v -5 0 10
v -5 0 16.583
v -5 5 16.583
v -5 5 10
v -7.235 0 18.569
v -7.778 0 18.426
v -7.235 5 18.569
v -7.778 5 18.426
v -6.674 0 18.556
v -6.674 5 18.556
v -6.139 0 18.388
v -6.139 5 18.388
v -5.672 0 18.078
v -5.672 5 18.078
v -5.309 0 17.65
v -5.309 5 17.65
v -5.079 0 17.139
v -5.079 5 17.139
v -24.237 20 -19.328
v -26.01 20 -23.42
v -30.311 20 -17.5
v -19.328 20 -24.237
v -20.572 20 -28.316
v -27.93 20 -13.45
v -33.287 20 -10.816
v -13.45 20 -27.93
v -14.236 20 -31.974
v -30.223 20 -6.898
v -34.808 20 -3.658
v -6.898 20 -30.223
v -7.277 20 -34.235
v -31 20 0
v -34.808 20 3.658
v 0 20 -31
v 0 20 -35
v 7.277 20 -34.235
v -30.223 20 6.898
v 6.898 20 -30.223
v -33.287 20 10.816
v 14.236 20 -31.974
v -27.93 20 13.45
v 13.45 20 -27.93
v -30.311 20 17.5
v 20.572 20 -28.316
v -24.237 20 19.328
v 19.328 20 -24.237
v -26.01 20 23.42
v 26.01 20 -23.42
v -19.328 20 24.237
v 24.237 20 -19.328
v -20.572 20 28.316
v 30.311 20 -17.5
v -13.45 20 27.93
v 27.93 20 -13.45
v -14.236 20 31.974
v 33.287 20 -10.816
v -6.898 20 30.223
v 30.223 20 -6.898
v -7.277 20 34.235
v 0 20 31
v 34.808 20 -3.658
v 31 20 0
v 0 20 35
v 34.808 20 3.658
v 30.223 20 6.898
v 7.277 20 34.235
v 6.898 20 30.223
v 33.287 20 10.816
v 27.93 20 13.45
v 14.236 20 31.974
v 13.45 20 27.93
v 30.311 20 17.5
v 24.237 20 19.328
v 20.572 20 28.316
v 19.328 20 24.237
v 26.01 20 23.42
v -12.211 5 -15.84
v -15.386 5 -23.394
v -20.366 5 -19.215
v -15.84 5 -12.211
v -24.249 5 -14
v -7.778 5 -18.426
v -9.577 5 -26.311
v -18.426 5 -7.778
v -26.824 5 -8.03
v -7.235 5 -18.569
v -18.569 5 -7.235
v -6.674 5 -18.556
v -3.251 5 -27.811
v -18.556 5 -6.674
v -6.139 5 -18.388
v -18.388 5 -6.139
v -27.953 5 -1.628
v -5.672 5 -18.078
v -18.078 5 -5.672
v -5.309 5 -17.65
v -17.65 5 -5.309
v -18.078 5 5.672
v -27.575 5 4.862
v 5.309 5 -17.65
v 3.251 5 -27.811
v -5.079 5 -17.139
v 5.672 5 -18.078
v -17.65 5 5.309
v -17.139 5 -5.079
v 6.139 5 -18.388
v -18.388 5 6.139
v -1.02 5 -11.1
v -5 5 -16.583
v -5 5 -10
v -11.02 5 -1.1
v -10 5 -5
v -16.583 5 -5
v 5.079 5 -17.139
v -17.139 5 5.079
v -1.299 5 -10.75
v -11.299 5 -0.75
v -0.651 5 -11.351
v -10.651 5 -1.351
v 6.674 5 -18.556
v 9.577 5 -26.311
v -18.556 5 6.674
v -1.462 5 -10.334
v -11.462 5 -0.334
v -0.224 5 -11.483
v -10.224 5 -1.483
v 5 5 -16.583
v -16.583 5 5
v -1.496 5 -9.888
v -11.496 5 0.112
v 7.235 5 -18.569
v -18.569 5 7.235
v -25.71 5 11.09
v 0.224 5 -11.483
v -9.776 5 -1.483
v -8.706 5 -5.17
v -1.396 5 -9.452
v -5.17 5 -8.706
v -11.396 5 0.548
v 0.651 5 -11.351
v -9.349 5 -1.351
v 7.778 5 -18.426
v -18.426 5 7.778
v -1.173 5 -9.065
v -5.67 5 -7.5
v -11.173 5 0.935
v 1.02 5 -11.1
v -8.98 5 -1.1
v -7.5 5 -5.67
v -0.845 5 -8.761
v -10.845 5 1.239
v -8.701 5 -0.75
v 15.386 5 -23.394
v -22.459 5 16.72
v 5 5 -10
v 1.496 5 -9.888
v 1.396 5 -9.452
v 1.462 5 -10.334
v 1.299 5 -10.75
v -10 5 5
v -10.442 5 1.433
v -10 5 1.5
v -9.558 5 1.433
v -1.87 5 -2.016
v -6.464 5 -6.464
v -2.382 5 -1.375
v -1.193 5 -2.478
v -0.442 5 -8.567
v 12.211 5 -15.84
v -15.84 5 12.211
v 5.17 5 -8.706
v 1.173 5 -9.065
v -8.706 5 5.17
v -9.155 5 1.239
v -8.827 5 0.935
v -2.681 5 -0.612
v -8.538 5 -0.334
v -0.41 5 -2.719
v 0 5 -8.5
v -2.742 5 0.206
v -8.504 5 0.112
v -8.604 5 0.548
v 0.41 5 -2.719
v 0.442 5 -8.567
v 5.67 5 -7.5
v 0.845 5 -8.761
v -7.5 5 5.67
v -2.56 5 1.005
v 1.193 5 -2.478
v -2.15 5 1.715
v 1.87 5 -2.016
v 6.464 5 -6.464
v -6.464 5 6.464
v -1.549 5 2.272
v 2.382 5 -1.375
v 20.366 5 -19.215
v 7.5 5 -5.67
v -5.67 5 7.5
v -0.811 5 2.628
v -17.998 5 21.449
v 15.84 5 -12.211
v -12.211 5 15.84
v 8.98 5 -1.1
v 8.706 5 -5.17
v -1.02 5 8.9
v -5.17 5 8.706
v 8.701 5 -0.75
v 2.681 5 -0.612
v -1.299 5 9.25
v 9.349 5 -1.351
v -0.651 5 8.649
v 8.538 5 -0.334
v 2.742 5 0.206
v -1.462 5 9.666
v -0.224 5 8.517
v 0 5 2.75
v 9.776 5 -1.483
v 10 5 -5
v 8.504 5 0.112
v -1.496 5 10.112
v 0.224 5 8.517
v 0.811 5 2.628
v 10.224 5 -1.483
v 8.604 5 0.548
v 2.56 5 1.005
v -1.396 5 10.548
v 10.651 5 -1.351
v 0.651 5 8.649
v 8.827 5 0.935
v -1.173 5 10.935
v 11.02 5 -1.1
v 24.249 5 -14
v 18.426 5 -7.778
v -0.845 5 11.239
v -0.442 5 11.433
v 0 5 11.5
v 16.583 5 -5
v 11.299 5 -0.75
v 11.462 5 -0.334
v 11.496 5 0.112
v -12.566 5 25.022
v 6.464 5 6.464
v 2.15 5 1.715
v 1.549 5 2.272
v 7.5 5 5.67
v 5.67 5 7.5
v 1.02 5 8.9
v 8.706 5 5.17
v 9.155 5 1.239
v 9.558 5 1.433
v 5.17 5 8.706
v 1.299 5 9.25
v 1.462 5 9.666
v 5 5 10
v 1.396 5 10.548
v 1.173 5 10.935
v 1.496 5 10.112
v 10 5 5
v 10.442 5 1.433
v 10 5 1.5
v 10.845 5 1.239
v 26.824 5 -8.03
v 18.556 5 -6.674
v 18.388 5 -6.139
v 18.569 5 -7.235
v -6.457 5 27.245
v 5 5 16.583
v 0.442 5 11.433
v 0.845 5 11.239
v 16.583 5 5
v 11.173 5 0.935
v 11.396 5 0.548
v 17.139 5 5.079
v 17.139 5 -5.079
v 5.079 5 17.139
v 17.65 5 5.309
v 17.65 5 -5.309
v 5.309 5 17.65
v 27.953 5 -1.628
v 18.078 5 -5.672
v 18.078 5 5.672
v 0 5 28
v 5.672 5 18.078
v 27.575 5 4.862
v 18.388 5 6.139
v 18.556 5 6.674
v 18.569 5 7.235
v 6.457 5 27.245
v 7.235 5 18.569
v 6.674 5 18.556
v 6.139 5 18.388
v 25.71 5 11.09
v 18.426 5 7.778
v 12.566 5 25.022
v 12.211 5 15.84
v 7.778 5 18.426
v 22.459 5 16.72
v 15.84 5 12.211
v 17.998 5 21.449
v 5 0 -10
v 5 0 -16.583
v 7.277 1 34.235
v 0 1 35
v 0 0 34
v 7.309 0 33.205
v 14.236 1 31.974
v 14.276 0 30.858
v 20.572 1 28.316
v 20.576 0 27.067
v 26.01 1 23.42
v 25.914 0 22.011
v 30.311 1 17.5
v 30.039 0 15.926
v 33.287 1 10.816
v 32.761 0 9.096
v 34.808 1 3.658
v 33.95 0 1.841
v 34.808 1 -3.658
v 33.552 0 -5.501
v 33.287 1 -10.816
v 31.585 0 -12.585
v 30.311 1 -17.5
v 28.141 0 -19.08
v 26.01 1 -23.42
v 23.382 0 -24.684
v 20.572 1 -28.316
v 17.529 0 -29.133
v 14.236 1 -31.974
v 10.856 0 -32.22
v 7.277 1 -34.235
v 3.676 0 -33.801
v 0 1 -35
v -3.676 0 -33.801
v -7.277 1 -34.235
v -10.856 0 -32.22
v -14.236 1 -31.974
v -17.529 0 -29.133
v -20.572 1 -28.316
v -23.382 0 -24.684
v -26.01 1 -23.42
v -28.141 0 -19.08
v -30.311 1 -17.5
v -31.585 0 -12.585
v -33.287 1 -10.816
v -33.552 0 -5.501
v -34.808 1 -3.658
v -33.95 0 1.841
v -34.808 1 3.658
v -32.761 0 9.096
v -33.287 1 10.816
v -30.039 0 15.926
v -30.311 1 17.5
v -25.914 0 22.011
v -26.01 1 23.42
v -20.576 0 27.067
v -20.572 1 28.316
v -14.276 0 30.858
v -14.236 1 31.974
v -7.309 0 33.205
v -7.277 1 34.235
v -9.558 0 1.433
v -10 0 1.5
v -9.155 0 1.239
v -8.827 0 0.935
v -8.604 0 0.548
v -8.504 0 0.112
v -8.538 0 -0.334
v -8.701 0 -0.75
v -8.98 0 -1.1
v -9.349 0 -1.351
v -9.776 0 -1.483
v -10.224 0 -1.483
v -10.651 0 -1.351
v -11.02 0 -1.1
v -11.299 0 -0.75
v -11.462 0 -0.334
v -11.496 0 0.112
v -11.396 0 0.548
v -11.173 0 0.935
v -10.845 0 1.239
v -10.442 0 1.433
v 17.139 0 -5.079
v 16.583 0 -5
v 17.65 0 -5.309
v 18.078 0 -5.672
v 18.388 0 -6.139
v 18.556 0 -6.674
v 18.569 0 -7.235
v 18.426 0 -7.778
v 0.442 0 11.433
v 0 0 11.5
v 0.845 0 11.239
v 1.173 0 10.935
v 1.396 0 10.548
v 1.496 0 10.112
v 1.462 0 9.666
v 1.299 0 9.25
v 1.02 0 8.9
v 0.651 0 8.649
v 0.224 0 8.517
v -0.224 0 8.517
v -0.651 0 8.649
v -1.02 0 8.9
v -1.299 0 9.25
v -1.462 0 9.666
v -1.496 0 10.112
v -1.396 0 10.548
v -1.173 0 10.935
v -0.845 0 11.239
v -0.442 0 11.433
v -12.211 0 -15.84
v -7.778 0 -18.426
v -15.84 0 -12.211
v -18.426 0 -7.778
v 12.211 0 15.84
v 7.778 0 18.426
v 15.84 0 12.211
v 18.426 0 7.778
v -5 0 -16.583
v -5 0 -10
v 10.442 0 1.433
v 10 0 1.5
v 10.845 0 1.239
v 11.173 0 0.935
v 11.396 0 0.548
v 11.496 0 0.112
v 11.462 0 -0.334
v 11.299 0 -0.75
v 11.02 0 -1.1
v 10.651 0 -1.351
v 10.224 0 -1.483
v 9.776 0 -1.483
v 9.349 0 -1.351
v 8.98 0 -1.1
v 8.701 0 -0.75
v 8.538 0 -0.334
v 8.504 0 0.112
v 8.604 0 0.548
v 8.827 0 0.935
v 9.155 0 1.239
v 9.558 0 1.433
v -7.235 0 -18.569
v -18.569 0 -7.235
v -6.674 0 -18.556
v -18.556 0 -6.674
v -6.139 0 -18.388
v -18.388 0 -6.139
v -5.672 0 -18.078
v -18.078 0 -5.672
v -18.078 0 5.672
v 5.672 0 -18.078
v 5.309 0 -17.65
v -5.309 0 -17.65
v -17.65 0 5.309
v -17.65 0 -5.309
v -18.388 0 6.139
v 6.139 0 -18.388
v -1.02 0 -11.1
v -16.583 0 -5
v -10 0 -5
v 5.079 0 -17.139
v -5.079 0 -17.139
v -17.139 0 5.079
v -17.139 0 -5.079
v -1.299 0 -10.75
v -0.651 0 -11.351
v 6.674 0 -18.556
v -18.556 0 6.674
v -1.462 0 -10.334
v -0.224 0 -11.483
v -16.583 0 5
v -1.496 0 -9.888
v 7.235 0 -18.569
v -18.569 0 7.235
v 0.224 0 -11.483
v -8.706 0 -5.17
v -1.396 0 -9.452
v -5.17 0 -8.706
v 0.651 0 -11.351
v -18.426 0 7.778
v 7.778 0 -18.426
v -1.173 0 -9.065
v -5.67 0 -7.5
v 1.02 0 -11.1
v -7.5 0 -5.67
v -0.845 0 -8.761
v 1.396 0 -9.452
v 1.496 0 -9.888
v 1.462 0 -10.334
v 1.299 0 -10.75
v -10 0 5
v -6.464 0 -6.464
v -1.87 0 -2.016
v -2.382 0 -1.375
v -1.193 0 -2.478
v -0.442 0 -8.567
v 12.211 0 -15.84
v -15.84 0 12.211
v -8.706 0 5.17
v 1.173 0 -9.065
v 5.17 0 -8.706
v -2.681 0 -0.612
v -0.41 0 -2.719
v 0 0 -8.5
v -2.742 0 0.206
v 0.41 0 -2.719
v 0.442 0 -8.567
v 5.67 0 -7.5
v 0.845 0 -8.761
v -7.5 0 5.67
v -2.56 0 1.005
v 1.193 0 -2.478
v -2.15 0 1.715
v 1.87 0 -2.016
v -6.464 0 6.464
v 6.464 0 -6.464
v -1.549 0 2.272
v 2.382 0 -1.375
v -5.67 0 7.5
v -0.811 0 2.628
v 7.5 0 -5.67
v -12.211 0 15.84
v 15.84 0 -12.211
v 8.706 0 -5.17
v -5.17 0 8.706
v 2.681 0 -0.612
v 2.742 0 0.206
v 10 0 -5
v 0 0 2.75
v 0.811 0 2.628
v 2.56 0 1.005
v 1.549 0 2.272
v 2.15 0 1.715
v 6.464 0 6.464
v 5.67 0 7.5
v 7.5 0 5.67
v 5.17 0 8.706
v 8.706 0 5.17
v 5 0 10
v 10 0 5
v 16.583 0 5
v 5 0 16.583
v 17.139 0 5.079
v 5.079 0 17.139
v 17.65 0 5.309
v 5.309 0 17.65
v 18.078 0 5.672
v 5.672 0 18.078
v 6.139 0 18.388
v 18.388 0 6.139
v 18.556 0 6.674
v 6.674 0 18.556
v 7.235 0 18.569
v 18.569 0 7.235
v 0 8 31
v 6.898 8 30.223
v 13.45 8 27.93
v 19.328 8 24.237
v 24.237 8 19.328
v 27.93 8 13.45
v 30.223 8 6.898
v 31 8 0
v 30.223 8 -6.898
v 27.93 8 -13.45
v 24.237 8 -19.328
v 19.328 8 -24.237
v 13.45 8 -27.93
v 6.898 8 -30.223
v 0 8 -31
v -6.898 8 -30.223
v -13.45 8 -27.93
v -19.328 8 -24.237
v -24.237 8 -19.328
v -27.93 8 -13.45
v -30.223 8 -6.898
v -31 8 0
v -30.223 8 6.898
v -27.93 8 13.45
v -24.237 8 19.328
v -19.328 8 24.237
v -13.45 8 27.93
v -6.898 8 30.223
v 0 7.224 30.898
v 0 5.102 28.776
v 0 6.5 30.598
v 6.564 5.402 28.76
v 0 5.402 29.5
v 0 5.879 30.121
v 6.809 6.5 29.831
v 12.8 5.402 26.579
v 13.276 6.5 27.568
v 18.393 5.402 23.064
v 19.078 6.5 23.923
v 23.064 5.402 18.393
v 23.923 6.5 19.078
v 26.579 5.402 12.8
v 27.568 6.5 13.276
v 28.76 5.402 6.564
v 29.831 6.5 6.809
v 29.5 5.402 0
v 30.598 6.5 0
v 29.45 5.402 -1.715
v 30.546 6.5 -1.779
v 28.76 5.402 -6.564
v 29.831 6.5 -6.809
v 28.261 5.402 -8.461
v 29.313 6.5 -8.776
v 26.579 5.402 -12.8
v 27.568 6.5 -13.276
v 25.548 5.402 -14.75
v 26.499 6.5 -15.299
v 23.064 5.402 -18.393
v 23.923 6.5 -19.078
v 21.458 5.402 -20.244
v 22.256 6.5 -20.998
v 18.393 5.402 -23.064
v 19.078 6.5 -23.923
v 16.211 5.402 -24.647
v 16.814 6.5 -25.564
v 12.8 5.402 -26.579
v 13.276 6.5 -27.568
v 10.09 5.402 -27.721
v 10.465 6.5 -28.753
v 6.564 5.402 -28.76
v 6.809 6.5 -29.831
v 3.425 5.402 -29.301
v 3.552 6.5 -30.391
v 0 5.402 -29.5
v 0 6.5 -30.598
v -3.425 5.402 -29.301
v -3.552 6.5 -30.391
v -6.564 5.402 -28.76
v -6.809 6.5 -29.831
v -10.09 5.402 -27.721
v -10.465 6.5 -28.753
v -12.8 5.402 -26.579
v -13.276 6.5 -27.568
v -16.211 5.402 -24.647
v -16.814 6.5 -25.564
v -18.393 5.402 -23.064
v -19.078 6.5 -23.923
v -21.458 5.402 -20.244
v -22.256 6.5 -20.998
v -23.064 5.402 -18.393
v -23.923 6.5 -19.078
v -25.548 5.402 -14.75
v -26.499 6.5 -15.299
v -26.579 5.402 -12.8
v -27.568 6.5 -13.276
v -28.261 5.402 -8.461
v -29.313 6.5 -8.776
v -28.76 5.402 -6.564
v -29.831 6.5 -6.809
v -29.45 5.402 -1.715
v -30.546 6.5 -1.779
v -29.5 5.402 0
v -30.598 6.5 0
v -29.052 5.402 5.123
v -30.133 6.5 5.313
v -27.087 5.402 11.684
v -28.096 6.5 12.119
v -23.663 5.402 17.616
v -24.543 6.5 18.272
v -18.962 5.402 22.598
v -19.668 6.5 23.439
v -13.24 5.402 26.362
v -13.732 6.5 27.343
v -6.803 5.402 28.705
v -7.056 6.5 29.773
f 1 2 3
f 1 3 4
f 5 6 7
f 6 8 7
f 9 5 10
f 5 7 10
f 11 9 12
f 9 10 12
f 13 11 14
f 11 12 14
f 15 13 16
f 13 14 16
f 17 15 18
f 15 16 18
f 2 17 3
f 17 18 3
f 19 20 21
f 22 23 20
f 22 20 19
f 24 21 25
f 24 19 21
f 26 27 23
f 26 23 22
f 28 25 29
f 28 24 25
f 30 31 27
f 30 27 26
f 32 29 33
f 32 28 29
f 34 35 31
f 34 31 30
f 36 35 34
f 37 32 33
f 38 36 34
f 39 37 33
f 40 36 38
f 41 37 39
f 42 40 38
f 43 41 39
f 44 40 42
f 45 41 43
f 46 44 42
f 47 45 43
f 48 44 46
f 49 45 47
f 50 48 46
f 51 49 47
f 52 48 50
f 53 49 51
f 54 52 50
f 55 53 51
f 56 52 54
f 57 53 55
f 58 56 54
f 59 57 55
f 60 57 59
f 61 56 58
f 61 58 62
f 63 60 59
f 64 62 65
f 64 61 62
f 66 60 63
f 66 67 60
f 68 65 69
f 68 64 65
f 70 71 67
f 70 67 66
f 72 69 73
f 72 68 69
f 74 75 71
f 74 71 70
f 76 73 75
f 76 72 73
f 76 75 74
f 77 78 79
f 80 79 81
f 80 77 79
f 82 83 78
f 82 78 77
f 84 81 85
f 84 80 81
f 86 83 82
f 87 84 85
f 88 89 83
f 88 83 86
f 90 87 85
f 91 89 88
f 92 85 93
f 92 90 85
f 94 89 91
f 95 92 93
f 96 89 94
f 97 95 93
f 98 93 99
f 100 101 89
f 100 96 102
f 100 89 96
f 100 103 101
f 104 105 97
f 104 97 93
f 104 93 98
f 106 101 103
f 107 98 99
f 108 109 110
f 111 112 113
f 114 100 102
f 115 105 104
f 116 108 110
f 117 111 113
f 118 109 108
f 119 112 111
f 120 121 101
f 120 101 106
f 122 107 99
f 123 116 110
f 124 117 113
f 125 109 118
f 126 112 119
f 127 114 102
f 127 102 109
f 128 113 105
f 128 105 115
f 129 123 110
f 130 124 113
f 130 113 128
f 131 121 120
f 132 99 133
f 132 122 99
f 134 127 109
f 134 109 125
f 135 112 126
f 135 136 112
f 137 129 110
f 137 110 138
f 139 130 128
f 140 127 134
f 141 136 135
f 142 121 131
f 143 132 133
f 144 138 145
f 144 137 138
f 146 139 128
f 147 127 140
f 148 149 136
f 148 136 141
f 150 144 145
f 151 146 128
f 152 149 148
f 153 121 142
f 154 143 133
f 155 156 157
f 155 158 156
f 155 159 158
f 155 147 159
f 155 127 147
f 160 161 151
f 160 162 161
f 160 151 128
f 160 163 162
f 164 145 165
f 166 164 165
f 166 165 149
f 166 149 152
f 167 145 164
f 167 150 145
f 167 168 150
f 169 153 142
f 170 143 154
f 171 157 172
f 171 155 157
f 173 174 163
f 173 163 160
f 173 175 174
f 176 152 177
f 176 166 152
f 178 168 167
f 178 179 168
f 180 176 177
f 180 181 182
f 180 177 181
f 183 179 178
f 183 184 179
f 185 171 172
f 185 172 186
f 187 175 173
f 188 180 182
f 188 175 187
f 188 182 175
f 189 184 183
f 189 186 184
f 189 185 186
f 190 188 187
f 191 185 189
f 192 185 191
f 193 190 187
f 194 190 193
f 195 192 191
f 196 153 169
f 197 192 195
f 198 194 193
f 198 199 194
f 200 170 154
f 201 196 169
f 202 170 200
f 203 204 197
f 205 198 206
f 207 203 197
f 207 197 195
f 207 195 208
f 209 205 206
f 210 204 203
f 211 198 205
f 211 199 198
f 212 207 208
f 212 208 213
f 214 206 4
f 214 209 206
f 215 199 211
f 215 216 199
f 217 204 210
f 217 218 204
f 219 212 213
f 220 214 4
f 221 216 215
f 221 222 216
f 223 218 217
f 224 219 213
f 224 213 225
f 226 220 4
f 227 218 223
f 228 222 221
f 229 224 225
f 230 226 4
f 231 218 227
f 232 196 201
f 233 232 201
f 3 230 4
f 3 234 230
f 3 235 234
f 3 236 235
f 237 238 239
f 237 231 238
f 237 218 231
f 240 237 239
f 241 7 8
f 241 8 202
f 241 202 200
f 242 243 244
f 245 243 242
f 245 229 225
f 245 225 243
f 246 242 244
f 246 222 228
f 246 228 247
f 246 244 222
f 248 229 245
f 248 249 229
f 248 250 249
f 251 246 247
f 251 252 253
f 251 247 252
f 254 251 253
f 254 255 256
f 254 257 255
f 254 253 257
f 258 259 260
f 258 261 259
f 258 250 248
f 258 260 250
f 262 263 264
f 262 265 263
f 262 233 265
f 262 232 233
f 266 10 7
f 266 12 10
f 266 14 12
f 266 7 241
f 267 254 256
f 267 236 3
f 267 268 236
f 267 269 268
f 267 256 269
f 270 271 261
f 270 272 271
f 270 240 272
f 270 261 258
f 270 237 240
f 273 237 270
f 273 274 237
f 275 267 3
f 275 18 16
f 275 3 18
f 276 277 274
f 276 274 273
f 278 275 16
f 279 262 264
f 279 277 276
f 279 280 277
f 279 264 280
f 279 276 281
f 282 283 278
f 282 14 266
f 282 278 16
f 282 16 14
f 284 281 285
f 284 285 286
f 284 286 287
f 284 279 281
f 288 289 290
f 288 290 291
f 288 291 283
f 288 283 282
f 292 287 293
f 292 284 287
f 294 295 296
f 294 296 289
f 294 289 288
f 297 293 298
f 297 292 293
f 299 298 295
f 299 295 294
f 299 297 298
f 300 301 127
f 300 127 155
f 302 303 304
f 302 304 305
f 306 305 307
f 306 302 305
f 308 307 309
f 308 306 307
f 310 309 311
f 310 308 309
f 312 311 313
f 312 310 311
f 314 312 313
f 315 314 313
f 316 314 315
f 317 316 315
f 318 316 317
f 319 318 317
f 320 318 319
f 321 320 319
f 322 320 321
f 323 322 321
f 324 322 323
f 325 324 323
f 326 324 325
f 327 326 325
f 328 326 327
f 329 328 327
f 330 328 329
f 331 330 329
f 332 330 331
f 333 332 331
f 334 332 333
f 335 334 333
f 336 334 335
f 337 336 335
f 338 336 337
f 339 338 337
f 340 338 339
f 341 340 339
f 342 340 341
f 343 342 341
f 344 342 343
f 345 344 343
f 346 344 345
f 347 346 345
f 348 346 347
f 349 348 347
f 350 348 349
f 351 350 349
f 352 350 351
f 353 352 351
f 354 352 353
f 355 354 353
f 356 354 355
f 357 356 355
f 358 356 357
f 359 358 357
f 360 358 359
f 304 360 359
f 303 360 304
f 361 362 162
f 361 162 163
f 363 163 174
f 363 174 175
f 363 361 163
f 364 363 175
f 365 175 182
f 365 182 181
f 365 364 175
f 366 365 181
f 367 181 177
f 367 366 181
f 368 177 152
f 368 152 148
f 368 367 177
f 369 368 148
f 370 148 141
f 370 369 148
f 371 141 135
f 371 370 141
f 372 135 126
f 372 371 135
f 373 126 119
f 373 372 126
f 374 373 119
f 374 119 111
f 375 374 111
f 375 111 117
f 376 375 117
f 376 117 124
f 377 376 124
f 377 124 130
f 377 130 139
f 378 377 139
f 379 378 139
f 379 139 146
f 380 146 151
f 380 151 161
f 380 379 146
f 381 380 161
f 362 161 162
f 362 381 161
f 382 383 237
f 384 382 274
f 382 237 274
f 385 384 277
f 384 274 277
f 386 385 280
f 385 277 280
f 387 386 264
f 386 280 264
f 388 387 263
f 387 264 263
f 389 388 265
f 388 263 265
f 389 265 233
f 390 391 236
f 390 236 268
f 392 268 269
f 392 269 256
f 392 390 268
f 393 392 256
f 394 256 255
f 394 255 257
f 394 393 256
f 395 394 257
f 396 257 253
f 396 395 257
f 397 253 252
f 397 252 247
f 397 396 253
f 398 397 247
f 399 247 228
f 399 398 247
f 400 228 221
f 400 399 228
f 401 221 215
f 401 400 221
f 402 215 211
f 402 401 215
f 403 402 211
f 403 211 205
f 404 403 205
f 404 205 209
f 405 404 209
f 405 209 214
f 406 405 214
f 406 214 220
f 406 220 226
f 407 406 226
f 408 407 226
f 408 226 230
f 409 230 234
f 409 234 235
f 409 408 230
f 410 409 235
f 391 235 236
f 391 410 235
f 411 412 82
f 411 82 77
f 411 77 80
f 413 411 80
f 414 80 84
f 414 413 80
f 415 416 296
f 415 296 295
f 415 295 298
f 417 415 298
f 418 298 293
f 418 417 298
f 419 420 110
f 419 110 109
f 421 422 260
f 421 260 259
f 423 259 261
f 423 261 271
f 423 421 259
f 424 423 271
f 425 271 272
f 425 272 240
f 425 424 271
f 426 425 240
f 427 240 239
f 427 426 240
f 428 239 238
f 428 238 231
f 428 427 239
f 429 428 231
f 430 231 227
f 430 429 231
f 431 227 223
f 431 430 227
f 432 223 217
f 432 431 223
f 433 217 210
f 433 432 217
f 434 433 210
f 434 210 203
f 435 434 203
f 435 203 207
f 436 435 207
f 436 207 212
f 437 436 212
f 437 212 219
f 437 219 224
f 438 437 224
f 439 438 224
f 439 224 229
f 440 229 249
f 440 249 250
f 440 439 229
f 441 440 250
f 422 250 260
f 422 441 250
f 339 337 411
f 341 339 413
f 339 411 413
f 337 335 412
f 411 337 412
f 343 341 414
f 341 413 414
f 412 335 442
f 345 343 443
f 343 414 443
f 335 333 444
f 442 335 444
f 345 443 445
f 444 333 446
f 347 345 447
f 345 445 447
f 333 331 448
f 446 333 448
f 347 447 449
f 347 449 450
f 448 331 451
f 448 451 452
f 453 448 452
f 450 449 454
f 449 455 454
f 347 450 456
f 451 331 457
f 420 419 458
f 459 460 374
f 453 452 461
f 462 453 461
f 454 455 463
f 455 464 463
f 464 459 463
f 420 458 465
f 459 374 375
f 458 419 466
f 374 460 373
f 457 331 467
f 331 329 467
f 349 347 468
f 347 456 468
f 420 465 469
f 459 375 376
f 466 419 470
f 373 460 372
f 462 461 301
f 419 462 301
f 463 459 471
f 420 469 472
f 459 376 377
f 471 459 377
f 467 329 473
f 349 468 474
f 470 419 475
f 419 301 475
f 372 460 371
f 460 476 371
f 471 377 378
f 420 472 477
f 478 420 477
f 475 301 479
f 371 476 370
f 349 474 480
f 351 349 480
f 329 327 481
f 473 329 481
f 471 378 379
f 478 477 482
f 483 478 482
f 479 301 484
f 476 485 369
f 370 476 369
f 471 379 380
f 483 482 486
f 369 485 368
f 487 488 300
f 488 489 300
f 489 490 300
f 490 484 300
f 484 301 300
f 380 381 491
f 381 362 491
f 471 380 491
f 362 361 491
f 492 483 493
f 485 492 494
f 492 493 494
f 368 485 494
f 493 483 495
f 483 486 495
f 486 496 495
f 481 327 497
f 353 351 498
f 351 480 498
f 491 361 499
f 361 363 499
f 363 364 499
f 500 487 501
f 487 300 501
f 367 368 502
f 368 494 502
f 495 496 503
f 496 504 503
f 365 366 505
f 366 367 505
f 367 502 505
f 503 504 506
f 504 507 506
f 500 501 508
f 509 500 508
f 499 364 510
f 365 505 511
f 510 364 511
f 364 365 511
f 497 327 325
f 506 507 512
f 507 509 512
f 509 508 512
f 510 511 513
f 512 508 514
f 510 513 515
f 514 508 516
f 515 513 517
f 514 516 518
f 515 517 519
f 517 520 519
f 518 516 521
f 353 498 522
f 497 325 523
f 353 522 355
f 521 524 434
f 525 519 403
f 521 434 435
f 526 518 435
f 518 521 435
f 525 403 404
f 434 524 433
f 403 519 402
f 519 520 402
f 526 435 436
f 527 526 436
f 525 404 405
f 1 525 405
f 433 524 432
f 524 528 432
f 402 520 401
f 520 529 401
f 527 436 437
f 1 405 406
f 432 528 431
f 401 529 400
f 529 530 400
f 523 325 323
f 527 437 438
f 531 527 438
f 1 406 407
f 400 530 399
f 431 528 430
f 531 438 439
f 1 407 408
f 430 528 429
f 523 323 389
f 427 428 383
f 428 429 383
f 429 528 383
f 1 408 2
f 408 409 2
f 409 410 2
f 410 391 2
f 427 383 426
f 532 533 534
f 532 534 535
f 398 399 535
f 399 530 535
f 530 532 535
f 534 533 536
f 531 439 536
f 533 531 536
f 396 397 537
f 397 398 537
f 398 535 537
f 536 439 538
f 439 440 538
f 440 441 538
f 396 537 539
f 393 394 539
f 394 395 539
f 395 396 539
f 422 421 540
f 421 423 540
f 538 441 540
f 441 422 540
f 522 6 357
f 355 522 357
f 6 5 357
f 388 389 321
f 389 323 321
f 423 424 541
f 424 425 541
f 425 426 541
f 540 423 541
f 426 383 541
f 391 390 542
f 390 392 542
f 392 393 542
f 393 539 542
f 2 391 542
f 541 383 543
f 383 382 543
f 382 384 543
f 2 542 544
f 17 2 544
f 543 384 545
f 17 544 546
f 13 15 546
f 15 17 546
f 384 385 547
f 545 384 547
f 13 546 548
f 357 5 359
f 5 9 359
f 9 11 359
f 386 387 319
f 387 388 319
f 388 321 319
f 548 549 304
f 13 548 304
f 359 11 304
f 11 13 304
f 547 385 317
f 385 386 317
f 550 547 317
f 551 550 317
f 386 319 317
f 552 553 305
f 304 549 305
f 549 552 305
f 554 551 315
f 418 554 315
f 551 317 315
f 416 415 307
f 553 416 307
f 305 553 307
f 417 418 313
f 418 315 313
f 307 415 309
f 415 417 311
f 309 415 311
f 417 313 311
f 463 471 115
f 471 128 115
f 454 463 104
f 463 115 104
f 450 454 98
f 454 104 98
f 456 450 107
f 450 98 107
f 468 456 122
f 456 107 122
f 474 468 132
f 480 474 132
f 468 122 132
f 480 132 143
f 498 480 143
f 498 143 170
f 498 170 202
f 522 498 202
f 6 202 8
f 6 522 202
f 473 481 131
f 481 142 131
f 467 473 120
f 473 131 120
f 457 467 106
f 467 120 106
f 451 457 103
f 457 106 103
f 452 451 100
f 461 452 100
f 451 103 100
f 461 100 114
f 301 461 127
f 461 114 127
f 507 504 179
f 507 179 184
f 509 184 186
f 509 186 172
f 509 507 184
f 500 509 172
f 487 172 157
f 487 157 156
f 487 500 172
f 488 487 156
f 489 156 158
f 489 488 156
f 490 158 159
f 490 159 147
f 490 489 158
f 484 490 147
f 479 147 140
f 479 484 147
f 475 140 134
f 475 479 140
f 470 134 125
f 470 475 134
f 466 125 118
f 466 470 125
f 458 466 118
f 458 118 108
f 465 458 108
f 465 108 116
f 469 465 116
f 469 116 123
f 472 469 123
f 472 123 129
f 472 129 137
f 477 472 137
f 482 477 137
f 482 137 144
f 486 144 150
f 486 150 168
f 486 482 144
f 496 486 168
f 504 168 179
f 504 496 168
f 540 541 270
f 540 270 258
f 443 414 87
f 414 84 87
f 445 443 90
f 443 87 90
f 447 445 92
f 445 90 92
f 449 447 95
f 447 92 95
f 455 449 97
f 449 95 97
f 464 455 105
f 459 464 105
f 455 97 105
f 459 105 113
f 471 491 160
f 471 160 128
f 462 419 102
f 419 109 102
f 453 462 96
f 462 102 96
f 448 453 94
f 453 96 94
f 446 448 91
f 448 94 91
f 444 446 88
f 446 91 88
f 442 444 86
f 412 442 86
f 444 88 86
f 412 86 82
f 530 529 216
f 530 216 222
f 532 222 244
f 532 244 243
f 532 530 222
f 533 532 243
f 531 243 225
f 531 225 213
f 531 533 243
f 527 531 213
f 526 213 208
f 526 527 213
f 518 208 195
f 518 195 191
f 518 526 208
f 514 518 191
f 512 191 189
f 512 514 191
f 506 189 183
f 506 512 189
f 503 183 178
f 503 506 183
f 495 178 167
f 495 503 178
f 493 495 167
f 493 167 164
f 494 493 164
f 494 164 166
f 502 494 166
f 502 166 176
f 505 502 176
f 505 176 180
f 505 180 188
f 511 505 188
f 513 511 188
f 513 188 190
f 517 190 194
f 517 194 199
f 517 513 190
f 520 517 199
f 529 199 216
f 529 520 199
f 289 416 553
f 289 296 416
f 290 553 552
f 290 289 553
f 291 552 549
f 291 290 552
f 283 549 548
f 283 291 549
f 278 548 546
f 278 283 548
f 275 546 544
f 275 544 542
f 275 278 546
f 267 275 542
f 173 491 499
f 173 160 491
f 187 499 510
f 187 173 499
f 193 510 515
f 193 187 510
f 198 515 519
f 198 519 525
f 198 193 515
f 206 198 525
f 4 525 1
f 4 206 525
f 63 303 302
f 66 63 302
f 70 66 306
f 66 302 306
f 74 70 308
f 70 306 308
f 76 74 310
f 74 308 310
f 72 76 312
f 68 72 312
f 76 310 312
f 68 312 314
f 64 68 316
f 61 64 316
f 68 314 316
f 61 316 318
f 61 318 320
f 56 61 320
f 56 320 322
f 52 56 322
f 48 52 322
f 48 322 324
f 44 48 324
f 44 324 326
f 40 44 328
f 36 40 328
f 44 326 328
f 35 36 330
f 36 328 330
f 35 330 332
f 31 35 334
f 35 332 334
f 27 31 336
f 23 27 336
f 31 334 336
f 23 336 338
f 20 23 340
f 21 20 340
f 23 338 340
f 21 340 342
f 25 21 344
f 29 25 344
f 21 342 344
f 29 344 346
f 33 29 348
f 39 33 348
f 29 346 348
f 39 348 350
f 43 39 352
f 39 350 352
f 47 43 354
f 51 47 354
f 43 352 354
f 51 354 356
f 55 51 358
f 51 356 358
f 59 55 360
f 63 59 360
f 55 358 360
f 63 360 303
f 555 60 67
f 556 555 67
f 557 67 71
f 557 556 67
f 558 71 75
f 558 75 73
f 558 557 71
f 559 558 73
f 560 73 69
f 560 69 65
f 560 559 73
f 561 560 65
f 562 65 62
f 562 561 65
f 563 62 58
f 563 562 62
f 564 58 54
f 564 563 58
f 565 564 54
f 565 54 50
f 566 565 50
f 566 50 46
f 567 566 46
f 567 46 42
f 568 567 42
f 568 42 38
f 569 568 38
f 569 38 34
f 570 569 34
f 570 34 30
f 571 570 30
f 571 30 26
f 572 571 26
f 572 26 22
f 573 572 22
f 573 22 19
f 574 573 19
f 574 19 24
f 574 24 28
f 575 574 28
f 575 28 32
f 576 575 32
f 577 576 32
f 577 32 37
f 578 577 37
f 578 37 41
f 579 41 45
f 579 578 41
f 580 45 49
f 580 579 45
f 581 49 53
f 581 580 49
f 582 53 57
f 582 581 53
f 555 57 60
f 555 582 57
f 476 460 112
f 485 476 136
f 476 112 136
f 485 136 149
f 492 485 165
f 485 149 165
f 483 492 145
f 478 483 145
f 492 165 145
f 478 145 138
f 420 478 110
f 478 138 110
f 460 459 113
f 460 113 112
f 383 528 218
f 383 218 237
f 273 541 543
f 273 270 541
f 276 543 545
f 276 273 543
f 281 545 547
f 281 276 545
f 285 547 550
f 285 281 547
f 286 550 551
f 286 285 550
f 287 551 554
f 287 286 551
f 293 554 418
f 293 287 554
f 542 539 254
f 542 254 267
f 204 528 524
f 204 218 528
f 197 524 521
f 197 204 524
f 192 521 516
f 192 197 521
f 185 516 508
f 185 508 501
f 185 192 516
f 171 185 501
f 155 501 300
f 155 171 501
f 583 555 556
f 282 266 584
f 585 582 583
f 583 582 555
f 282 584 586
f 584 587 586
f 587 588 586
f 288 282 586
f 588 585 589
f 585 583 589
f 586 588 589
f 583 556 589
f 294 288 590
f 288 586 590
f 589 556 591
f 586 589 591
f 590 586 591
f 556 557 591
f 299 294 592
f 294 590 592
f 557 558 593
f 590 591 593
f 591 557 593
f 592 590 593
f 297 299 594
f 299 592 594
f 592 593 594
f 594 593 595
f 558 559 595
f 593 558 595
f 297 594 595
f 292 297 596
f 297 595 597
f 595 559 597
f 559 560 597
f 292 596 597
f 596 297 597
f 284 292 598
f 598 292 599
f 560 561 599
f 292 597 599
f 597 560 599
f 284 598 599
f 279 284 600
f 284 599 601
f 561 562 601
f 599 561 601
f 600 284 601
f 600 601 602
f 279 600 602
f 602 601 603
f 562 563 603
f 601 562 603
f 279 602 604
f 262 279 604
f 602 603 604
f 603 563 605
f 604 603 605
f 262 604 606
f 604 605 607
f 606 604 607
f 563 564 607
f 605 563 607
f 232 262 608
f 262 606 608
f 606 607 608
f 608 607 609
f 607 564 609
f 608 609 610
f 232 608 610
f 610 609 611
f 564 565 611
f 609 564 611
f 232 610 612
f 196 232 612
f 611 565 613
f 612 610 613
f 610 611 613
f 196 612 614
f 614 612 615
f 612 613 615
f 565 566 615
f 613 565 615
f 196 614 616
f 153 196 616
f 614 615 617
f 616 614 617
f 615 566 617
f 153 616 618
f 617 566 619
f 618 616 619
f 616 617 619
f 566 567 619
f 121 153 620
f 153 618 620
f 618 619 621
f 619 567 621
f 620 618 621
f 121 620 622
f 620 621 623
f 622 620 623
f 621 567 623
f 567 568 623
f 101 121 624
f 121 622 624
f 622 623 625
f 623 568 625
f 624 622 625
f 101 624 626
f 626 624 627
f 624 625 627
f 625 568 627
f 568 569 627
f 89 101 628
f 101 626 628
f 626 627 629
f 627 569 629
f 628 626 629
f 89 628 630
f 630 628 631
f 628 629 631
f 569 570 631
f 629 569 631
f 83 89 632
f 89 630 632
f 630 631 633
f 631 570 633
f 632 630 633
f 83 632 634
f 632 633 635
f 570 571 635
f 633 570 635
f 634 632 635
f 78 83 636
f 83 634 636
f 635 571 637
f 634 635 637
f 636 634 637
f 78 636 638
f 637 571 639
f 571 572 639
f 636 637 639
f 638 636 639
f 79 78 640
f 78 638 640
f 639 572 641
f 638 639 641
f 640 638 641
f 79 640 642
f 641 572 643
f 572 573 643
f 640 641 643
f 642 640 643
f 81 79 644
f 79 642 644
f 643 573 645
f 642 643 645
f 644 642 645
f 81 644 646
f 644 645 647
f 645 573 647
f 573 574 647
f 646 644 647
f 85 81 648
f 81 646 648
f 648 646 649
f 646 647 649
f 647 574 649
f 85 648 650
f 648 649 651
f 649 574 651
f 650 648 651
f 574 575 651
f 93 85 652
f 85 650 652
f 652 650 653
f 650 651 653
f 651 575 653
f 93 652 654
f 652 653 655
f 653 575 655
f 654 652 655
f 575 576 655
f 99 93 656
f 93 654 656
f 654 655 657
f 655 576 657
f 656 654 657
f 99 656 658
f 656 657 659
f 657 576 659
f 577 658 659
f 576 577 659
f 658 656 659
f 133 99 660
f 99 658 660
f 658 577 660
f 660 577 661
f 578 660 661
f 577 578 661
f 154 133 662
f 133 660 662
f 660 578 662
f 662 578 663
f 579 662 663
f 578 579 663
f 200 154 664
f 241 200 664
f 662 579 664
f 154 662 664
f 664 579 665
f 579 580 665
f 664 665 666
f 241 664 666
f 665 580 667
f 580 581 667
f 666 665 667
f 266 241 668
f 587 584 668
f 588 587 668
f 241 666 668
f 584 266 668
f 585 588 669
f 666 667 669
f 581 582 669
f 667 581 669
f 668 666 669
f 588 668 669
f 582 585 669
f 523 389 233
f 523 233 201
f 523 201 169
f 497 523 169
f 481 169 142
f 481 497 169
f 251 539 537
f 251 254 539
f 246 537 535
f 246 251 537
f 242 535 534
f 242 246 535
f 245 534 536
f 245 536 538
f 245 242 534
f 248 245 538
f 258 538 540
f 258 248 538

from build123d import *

# Parameters (mm, degrees)
SKETCH_1_R      = 31
SKETCH_1_R_2    = 1.5
SKETCH_1_R_3    = 2.75
EXTRUDE_1_DEPTH = 5
SKETCH_1_4_R    = 35
SKETCH_1_4_R_2  = 31
EXTRUDE_3_DEPTH = 20
FILLET_1_R      = 5
FILLET_2_R      = 2
CHAMFER_1_SIZE  = 1
FILLET_3_R      = 3


with BuildPart() as part:
    # 草图1 → 凸台-拉伸1 (new body)
    with BuildSketch(Plane(origin=(0, 0, 0), x_dir=(1, 0, 0), z_dir=(0, 1, 0))):
        Circle(SKETCH_1_R)
        with BuildLine():
            Line((-5, -5), (-5, -19.364916731))
            ThreePointArc((-5, -19.364916731), (-14.142135624, -14.142135624), (-19.364916731, -5))
            Line((-19.364916731, -5), (-5, -5))
        make_face(mode=Mode.SUBTRACT)
        with Locations((0, -10)):
            Circle(SKETCH_1_R_2, mode=Mode.SUBTRACT)
        with BuildLine():
            Line((5, -5), (19.364916731, -5))
            ThreePointArc((19.364916731, -5), (14.142135624, -14.142135624), (5, -19.364916731))
            Line((5, -19.364916731), (5, -5))
        make_face(mode=Mode.SUBTRACT)
        with Locations((-10, 0)):
            Circle(SKETCH_1_R_2, mode=Mode.SUBTRACT)
        with BuildLine():
            Line((-5, 5), (-19.364916731, 5))
            ThreePointArc((-19.364916731, 5), (-14.142135624, 14.142135624), (-5, 19.364916731))
            Line((-5, 19.364916731), (-5, 5))
        make_face(mode=Mode.SUBTRACT)
        Circle(SKETCH_1_R_3, mode=Mode.SUBTRACT)
        with Locations((10, 0)):
            Circle(SKETCH_1_R_2, mode=Mode.SUBTRACT)
        with Locations((0, 10)):
            Circle(SKETCH_1_R_2, mode=Mode.SUBTRACT)
        with BuildLine():
            Line((5, 5), (5, 19.364916731))
            ThreePointArc((5, 19.364916731), (14.142135624, 14.142135624), (19.364916731, 5))
            Line((19.364916731, 5), (5, 5))
        make_face(mode=Mode.SUBTRACT)
    extrude(amount=EXTRUDE_1_DEPTH)

    # 草图1<4> → 凸台-拉伸3 (add)
    with BuildSketch(Plane(origin=(0, 0, 0), x_dir=(1, 0, 0), z_dir=(0, 1, 0))):
        Circle(SKETCH_1_4_R)
        Circle(SKETCH_1_4_R_2, mode=Mode.SUBTRACT)
    extrude(amount=EXTRUDE_3_DEPTH)

    # 圆角1
    fillet_1_edges = [part.edges().sort_by_distance(p)[0] for p in [
        (-5, 2.5, 5),
        (5, 2.5, 5),
        (5, 2.5, -5),
        (-5, 2.5, -5),
    ]]
    fillet(fillet_1_edges, radius=FILLET_1_R)

    # 圆角2
    fillet_2_edges = [part.edges().sort_by_distance(p)[0] for p in [
        (5, 2.5, 19.364916731),
        (19.364916731, 2.5, 5),
        (19.364916731, 2.5, -5),
        (5, 2.5, -19.364916731),
        (-5, 2.5, 19.364916731),
        (-19.364916731, 2.5, 5),
        (-5, 2.5, -19.364916731),
        (-19.364916731, 2.5, -5),
    ]]
    fillet(fillet_2_edges, radius=FILLET_2_R)

    # 倒角1
    chamfer_1_edges = [part.edges().sort_by_distance(p)[0] for p in [
        (-35, 0, 0),
    ]]
    chamfer(chamfer_1_edges, length=CHAMFER_1_SIZE)

    # 圆角3
    fillet_3_edges = [part.edges().sort_by_distance(p)[0] for p in [
        (-31, 5, 0),
    ]]
    fillet(fillet_3_edges, radius=FILLET_3_R)


solid = part.part
